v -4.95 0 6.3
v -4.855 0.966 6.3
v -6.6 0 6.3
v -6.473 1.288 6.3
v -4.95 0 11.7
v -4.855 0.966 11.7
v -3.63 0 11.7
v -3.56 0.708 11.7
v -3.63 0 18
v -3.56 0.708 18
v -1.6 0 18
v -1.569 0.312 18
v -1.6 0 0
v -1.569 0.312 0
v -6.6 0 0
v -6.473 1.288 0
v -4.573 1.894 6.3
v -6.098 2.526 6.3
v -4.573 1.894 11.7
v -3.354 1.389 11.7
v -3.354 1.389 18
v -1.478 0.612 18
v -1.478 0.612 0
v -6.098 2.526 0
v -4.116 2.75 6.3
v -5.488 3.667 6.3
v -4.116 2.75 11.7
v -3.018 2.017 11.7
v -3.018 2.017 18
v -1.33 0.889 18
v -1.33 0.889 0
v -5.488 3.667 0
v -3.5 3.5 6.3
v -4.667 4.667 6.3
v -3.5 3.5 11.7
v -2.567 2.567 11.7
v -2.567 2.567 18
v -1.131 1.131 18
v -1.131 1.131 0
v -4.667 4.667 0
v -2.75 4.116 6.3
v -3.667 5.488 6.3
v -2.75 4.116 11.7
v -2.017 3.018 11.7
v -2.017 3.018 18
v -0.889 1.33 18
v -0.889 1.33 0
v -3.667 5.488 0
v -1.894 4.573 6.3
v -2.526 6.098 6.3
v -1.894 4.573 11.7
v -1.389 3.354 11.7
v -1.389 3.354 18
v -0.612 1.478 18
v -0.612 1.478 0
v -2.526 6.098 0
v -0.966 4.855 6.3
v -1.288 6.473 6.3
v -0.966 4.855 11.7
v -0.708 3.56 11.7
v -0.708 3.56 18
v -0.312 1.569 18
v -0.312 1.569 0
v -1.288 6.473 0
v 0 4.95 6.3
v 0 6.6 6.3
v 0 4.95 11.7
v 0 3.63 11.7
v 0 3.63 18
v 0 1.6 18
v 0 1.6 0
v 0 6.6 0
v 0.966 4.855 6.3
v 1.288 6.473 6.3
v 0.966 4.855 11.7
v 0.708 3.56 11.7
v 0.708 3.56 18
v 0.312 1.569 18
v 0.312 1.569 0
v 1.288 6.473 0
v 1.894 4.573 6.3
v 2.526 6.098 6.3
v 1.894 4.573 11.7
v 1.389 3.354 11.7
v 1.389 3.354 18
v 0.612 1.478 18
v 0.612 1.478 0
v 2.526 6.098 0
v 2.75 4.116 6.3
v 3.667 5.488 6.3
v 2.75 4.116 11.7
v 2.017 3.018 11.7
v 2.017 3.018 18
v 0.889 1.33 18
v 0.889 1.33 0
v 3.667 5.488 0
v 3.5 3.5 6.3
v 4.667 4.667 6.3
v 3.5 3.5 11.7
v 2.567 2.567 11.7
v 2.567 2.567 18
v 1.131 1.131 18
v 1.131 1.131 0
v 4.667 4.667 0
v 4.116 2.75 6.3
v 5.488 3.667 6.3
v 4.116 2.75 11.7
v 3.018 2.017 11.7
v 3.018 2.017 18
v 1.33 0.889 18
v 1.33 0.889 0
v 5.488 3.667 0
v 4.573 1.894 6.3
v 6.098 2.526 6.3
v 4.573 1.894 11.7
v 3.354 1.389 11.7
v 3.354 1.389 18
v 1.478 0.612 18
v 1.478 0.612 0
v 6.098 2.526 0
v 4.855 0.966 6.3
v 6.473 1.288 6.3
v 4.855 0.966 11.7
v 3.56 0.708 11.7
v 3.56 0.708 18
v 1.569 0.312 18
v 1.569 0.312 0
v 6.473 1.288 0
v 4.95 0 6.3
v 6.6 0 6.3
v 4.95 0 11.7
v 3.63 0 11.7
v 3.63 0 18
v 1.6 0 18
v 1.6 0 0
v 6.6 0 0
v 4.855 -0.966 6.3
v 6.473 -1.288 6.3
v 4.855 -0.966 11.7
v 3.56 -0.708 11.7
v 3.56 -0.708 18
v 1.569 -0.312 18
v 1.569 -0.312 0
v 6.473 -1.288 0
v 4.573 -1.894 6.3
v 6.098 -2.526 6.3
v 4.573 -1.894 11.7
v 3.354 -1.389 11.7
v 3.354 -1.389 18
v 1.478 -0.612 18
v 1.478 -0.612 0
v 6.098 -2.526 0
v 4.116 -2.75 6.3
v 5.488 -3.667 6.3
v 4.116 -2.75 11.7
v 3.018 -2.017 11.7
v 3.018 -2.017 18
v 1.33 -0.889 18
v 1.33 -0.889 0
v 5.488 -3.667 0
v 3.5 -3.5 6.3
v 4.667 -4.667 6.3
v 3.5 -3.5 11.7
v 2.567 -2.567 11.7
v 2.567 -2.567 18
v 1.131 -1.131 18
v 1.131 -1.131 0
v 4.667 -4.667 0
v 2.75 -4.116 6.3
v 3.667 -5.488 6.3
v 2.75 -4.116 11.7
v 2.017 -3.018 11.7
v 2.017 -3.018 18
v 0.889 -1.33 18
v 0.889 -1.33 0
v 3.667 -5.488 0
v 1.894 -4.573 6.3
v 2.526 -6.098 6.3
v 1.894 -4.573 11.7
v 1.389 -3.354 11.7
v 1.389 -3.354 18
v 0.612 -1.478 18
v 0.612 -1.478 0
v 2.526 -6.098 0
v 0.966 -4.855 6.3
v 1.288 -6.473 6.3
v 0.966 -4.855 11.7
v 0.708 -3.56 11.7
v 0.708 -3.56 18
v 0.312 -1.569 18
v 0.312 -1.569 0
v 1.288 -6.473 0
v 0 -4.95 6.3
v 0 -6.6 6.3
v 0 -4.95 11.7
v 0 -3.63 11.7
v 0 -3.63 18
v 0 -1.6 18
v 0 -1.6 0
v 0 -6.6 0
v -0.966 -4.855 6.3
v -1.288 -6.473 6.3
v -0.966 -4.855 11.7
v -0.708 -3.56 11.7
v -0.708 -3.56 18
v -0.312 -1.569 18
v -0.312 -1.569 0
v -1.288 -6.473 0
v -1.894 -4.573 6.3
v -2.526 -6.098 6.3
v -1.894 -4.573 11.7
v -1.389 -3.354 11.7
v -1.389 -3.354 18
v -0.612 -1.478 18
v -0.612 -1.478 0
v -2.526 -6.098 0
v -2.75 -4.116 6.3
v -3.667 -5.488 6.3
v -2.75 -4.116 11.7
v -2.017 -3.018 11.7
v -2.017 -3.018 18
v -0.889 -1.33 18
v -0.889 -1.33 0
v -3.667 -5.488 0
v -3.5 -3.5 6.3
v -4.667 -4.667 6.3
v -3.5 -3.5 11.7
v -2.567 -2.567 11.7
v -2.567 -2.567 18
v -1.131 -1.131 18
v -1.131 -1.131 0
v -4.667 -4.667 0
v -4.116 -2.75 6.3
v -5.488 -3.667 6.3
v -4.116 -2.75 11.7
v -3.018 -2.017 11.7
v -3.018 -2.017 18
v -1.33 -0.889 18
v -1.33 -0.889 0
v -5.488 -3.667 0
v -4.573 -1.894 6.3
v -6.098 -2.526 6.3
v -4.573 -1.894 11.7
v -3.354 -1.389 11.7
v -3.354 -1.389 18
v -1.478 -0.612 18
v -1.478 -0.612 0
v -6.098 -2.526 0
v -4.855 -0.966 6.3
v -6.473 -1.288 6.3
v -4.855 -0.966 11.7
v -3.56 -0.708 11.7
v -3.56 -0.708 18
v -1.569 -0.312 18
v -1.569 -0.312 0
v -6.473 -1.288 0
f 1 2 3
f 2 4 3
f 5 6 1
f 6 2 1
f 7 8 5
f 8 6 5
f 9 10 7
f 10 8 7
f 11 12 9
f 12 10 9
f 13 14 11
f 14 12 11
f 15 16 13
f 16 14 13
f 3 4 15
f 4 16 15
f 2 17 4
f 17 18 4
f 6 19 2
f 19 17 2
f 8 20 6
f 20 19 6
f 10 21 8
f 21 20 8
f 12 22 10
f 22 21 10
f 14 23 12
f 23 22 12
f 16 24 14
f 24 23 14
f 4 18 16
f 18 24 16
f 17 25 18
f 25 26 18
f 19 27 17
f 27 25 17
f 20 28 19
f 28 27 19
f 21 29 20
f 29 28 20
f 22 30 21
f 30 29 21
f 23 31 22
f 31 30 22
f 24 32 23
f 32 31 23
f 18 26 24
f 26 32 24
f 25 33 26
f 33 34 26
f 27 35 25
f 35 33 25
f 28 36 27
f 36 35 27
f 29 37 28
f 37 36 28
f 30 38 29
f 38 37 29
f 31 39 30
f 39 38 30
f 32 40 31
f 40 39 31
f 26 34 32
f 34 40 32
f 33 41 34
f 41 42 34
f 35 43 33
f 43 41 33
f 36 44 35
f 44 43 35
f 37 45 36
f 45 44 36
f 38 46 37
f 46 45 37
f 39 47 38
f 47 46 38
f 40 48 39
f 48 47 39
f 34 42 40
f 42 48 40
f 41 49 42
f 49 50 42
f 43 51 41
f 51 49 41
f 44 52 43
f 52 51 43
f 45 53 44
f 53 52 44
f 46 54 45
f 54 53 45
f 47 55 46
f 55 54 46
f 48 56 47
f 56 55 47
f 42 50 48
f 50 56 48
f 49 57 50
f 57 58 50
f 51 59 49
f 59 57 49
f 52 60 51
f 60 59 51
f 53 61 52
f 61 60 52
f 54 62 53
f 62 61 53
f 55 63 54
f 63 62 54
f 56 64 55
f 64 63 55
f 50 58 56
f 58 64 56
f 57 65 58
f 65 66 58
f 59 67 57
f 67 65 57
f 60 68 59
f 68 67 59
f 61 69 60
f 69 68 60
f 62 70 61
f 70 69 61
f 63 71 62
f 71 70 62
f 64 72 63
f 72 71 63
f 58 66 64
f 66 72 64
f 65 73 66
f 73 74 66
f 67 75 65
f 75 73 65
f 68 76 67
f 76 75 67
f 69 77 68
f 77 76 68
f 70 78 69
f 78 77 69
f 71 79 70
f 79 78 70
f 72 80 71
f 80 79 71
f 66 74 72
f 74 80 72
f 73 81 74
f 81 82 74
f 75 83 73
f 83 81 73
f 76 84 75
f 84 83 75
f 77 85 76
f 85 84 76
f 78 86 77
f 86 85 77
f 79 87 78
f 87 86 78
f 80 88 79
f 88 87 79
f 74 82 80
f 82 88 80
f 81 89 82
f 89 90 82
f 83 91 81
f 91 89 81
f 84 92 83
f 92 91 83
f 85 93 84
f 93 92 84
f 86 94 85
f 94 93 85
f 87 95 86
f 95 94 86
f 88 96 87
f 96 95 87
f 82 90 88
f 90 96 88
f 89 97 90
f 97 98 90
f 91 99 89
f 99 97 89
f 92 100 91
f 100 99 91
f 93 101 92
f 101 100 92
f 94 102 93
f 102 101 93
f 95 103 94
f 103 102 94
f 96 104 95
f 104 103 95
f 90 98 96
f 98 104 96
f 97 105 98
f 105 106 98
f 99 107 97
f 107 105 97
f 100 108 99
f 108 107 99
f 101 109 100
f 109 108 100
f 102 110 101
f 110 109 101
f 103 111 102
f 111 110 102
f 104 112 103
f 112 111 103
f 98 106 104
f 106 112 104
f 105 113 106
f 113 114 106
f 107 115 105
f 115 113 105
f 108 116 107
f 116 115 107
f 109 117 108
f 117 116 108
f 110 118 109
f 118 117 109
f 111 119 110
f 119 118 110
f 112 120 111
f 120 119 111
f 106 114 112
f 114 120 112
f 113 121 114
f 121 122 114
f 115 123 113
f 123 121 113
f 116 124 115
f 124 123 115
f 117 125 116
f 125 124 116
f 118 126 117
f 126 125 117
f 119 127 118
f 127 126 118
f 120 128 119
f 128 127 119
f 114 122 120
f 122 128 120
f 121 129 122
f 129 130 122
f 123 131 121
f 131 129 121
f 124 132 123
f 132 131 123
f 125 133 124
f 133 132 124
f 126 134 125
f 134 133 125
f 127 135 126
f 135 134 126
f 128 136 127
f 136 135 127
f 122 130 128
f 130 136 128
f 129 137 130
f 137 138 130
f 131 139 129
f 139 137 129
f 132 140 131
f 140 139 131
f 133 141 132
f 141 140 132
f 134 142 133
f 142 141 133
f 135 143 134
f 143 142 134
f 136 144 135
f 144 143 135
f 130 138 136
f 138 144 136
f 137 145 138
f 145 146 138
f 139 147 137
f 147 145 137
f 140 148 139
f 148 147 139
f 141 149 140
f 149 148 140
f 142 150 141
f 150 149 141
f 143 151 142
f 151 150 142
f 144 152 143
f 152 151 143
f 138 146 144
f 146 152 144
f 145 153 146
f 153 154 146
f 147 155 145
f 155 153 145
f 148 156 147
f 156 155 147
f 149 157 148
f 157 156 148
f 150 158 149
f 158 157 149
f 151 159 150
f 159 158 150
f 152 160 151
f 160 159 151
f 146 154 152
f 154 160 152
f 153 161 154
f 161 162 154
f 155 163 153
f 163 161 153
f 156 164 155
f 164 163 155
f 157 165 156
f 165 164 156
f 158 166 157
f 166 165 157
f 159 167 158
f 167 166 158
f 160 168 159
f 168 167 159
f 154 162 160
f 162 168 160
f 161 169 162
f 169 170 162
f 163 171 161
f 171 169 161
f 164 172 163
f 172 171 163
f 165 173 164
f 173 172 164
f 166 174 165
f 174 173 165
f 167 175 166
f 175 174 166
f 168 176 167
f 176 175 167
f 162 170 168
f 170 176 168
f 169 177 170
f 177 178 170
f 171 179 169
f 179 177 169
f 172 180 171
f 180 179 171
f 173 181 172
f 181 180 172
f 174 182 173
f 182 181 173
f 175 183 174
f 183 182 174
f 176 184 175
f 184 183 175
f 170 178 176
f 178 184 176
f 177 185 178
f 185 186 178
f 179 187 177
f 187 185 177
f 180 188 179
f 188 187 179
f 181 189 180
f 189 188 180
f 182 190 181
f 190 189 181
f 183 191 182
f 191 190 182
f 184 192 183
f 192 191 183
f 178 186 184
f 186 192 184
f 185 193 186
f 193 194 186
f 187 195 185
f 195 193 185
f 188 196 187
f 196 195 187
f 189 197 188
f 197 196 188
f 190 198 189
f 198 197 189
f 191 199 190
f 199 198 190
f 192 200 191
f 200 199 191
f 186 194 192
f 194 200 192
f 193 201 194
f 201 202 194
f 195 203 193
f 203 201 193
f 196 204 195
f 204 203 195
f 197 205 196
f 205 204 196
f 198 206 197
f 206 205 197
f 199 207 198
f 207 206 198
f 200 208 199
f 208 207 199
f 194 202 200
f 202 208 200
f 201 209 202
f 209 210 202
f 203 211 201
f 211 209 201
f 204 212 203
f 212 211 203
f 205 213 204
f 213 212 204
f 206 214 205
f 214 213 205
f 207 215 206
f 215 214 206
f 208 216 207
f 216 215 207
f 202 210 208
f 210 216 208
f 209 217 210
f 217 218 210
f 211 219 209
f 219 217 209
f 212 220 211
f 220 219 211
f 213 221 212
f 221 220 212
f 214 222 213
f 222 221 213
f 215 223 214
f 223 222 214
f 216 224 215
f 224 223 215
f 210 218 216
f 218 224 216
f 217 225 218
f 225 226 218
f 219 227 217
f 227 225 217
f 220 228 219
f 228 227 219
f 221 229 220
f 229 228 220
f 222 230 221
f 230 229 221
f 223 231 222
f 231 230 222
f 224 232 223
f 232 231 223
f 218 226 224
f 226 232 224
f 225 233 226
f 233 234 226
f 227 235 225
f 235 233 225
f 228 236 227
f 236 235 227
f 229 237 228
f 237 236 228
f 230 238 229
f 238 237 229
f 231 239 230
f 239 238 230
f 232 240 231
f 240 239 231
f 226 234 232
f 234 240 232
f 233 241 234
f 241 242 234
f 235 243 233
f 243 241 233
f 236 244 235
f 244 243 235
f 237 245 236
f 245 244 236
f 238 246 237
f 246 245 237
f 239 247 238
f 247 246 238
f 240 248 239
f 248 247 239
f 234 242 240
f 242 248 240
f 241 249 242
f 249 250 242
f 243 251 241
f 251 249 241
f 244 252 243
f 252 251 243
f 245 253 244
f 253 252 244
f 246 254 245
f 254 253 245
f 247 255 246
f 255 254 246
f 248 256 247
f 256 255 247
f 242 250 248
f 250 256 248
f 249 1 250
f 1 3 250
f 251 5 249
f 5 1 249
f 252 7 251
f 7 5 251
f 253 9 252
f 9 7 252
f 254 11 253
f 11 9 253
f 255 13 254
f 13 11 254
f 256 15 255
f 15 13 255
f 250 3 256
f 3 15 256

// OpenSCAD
$fn = 32;

// ----------------------------------------------------------------------
// Profiled standoff: stepped spacer, 18 mm long, bore 3.2 mm
// ----------------------------------------------------------------------

// --- parameters (mm) ---
revolve_angle = 360;      // full turn around the Z axis
profile_points = 8;       // points of the closed outline

profile = [[1.6, 0], [6.6, 0], [6.6, 6.3], [4.95, 6.3], [4.95, 11.7], [3.63, 11.7], [3.63, 18], [1.6, 18]];  // single closed polygon, 8 points, counter clockwise

// --- the one profile operation ---
rotate_extrude(angle = revolve_angle) polygon(points = profile);
